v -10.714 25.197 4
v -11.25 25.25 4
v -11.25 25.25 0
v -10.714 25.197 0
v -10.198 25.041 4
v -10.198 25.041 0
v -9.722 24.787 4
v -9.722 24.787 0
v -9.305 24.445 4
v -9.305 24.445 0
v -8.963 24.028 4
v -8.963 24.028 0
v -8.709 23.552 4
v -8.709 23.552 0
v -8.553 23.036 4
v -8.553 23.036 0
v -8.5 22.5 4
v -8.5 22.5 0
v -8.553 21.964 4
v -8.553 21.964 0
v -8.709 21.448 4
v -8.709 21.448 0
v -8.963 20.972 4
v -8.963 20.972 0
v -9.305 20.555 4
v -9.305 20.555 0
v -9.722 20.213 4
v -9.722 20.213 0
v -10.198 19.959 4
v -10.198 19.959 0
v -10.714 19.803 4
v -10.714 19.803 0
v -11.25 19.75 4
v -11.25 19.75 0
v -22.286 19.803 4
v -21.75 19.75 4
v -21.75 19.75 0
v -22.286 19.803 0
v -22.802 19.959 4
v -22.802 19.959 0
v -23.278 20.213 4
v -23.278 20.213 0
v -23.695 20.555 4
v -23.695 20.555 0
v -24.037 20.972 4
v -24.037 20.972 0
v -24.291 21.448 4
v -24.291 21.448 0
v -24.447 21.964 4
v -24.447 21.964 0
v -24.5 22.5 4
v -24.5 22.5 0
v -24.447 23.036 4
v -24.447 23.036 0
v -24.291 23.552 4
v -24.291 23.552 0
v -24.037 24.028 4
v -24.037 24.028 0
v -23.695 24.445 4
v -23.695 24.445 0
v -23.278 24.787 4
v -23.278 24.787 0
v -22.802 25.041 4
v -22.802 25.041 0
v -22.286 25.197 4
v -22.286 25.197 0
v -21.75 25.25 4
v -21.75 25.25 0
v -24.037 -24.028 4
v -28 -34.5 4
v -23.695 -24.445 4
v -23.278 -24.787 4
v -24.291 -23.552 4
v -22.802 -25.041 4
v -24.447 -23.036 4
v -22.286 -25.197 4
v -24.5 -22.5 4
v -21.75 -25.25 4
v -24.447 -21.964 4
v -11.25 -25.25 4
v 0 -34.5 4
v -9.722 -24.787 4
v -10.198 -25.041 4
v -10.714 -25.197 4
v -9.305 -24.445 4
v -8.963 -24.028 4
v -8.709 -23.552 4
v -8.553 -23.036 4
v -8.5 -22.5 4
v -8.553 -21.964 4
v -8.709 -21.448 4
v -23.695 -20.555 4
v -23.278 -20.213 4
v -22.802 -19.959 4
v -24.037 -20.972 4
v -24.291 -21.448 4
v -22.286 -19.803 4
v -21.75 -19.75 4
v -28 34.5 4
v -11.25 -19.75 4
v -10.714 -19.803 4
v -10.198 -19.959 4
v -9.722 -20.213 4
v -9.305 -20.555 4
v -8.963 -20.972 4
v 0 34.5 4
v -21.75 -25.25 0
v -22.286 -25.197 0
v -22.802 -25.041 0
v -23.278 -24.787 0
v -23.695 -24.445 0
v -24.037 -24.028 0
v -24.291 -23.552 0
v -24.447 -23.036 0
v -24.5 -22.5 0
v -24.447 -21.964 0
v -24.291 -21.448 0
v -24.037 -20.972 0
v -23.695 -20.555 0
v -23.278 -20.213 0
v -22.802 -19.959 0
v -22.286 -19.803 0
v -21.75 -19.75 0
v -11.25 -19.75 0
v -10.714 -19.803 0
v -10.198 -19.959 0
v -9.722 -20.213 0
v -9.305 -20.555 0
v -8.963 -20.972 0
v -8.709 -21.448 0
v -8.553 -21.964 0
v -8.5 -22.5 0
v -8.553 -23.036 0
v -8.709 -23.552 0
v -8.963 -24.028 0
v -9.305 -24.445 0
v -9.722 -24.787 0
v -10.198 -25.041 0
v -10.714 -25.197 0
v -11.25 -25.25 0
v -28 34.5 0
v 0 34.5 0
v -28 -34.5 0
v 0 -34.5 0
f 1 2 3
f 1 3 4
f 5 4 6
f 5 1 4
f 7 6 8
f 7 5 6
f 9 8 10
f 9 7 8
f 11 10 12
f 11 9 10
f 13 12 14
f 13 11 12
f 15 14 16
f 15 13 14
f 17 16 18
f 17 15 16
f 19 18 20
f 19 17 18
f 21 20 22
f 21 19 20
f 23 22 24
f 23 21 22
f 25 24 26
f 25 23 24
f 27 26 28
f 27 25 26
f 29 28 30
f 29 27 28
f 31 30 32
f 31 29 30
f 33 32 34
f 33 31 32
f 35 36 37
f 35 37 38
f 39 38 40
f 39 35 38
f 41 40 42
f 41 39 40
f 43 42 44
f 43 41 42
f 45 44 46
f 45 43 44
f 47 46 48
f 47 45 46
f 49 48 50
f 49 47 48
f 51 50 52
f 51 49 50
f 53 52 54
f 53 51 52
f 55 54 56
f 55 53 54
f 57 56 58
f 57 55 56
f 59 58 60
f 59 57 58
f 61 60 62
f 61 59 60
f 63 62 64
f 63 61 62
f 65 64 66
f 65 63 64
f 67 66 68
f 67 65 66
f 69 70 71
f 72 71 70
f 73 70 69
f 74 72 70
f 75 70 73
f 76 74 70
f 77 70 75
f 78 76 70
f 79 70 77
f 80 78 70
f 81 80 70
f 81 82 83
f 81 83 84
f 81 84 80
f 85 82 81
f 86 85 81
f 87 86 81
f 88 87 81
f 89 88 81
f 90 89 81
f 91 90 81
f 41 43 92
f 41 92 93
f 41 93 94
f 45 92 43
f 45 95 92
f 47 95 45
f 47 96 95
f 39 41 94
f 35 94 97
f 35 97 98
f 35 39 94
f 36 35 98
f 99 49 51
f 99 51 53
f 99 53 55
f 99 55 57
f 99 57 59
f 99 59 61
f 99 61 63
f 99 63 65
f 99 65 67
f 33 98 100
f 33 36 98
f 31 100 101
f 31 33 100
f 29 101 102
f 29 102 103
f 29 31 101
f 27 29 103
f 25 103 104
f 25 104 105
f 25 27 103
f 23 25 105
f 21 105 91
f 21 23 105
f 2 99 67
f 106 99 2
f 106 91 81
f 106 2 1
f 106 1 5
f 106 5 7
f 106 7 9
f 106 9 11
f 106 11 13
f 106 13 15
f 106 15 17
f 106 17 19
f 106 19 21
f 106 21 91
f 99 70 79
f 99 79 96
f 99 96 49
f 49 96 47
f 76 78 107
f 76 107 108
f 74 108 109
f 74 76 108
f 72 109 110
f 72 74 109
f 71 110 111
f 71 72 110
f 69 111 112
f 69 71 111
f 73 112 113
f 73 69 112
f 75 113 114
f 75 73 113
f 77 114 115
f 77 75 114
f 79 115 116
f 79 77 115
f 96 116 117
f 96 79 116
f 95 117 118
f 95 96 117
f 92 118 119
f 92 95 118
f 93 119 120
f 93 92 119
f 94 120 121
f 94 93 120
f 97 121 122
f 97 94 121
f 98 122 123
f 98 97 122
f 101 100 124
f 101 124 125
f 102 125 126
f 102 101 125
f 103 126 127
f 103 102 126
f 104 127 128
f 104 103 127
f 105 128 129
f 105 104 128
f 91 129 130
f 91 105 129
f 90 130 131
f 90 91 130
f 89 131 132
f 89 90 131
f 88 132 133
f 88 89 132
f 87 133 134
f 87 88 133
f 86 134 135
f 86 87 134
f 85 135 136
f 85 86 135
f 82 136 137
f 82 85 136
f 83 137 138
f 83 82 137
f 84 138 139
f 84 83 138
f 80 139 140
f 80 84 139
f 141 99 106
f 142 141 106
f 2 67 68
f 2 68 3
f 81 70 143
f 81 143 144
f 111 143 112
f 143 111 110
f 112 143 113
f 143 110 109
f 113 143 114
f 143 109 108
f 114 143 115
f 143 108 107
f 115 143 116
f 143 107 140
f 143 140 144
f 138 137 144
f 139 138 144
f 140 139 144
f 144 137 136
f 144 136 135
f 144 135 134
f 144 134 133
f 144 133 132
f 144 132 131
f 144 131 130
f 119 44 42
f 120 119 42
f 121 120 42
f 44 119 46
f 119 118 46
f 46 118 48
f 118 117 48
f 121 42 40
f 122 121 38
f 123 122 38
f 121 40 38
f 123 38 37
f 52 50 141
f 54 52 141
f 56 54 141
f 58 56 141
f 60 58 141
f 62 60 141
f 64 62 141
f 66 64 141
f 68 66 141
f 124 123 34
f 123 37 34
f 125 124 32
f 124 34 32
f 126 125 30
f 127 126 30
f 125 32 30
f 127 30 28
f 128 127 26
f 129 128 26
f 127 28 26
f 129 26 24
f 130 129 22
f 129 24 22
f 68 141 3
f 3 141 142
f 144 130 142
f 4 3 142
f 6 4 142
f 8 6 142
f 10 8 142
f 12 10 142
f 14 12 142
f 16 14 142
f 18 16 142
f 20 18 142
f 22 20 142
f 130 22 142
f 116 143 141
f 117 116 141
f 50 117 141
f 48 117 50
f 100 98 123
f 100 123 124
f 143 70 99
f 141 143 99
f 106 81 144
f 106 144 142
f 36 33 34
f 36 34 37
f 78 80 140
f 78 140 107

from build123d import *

# Parameters (mm, degrees)
SKETCH1_W           = 28
SKETCH1_H           = 69
BOSS_EXTRUDE1_DEPTH = 4


with BuildPart() as part:
    # Sketch1 → Boss-Extrude1 (new body)
    with BuildSketch(Plane.XY.offset(4)):
        with Locations((-14, 0)):
            Rectangle(SKETCH1_W, SKETCH1_H)
        with BuildLine():
            Line((-21.75, 25.25), (-11.25, 25.25))
            ThreePointArc((-11.25, 25.25), (-8.5, 22.5), (-11.25, 19.75))
            Line((-11.25, 19.75), (-21.75, 19.75))
            ThreePointArc((-21.75, 19.75), (-24.5, 22.5), (-21.75, 25.25))
        make_face(mode=Mode.SUBTRACT)
        with BuildLine():
            Line((-21.75, -19.75), (-11.25, -19.75))
            ThreePointArc((-11.25, -19.75), (-8.5, -22.5), (-11.25, -25.25))
            Line((-11.25, -25.25), (-21.75, -25.25))
            ThreePointArc((-21.75, -25.25), (-24.5, -22.5), (-21.75, -19.75))
        make_face(mode=Mode.SUBTRACT)
    extrude(amount=-BOSS_EXTRUDE1_DEPTH)


solid = part.part
